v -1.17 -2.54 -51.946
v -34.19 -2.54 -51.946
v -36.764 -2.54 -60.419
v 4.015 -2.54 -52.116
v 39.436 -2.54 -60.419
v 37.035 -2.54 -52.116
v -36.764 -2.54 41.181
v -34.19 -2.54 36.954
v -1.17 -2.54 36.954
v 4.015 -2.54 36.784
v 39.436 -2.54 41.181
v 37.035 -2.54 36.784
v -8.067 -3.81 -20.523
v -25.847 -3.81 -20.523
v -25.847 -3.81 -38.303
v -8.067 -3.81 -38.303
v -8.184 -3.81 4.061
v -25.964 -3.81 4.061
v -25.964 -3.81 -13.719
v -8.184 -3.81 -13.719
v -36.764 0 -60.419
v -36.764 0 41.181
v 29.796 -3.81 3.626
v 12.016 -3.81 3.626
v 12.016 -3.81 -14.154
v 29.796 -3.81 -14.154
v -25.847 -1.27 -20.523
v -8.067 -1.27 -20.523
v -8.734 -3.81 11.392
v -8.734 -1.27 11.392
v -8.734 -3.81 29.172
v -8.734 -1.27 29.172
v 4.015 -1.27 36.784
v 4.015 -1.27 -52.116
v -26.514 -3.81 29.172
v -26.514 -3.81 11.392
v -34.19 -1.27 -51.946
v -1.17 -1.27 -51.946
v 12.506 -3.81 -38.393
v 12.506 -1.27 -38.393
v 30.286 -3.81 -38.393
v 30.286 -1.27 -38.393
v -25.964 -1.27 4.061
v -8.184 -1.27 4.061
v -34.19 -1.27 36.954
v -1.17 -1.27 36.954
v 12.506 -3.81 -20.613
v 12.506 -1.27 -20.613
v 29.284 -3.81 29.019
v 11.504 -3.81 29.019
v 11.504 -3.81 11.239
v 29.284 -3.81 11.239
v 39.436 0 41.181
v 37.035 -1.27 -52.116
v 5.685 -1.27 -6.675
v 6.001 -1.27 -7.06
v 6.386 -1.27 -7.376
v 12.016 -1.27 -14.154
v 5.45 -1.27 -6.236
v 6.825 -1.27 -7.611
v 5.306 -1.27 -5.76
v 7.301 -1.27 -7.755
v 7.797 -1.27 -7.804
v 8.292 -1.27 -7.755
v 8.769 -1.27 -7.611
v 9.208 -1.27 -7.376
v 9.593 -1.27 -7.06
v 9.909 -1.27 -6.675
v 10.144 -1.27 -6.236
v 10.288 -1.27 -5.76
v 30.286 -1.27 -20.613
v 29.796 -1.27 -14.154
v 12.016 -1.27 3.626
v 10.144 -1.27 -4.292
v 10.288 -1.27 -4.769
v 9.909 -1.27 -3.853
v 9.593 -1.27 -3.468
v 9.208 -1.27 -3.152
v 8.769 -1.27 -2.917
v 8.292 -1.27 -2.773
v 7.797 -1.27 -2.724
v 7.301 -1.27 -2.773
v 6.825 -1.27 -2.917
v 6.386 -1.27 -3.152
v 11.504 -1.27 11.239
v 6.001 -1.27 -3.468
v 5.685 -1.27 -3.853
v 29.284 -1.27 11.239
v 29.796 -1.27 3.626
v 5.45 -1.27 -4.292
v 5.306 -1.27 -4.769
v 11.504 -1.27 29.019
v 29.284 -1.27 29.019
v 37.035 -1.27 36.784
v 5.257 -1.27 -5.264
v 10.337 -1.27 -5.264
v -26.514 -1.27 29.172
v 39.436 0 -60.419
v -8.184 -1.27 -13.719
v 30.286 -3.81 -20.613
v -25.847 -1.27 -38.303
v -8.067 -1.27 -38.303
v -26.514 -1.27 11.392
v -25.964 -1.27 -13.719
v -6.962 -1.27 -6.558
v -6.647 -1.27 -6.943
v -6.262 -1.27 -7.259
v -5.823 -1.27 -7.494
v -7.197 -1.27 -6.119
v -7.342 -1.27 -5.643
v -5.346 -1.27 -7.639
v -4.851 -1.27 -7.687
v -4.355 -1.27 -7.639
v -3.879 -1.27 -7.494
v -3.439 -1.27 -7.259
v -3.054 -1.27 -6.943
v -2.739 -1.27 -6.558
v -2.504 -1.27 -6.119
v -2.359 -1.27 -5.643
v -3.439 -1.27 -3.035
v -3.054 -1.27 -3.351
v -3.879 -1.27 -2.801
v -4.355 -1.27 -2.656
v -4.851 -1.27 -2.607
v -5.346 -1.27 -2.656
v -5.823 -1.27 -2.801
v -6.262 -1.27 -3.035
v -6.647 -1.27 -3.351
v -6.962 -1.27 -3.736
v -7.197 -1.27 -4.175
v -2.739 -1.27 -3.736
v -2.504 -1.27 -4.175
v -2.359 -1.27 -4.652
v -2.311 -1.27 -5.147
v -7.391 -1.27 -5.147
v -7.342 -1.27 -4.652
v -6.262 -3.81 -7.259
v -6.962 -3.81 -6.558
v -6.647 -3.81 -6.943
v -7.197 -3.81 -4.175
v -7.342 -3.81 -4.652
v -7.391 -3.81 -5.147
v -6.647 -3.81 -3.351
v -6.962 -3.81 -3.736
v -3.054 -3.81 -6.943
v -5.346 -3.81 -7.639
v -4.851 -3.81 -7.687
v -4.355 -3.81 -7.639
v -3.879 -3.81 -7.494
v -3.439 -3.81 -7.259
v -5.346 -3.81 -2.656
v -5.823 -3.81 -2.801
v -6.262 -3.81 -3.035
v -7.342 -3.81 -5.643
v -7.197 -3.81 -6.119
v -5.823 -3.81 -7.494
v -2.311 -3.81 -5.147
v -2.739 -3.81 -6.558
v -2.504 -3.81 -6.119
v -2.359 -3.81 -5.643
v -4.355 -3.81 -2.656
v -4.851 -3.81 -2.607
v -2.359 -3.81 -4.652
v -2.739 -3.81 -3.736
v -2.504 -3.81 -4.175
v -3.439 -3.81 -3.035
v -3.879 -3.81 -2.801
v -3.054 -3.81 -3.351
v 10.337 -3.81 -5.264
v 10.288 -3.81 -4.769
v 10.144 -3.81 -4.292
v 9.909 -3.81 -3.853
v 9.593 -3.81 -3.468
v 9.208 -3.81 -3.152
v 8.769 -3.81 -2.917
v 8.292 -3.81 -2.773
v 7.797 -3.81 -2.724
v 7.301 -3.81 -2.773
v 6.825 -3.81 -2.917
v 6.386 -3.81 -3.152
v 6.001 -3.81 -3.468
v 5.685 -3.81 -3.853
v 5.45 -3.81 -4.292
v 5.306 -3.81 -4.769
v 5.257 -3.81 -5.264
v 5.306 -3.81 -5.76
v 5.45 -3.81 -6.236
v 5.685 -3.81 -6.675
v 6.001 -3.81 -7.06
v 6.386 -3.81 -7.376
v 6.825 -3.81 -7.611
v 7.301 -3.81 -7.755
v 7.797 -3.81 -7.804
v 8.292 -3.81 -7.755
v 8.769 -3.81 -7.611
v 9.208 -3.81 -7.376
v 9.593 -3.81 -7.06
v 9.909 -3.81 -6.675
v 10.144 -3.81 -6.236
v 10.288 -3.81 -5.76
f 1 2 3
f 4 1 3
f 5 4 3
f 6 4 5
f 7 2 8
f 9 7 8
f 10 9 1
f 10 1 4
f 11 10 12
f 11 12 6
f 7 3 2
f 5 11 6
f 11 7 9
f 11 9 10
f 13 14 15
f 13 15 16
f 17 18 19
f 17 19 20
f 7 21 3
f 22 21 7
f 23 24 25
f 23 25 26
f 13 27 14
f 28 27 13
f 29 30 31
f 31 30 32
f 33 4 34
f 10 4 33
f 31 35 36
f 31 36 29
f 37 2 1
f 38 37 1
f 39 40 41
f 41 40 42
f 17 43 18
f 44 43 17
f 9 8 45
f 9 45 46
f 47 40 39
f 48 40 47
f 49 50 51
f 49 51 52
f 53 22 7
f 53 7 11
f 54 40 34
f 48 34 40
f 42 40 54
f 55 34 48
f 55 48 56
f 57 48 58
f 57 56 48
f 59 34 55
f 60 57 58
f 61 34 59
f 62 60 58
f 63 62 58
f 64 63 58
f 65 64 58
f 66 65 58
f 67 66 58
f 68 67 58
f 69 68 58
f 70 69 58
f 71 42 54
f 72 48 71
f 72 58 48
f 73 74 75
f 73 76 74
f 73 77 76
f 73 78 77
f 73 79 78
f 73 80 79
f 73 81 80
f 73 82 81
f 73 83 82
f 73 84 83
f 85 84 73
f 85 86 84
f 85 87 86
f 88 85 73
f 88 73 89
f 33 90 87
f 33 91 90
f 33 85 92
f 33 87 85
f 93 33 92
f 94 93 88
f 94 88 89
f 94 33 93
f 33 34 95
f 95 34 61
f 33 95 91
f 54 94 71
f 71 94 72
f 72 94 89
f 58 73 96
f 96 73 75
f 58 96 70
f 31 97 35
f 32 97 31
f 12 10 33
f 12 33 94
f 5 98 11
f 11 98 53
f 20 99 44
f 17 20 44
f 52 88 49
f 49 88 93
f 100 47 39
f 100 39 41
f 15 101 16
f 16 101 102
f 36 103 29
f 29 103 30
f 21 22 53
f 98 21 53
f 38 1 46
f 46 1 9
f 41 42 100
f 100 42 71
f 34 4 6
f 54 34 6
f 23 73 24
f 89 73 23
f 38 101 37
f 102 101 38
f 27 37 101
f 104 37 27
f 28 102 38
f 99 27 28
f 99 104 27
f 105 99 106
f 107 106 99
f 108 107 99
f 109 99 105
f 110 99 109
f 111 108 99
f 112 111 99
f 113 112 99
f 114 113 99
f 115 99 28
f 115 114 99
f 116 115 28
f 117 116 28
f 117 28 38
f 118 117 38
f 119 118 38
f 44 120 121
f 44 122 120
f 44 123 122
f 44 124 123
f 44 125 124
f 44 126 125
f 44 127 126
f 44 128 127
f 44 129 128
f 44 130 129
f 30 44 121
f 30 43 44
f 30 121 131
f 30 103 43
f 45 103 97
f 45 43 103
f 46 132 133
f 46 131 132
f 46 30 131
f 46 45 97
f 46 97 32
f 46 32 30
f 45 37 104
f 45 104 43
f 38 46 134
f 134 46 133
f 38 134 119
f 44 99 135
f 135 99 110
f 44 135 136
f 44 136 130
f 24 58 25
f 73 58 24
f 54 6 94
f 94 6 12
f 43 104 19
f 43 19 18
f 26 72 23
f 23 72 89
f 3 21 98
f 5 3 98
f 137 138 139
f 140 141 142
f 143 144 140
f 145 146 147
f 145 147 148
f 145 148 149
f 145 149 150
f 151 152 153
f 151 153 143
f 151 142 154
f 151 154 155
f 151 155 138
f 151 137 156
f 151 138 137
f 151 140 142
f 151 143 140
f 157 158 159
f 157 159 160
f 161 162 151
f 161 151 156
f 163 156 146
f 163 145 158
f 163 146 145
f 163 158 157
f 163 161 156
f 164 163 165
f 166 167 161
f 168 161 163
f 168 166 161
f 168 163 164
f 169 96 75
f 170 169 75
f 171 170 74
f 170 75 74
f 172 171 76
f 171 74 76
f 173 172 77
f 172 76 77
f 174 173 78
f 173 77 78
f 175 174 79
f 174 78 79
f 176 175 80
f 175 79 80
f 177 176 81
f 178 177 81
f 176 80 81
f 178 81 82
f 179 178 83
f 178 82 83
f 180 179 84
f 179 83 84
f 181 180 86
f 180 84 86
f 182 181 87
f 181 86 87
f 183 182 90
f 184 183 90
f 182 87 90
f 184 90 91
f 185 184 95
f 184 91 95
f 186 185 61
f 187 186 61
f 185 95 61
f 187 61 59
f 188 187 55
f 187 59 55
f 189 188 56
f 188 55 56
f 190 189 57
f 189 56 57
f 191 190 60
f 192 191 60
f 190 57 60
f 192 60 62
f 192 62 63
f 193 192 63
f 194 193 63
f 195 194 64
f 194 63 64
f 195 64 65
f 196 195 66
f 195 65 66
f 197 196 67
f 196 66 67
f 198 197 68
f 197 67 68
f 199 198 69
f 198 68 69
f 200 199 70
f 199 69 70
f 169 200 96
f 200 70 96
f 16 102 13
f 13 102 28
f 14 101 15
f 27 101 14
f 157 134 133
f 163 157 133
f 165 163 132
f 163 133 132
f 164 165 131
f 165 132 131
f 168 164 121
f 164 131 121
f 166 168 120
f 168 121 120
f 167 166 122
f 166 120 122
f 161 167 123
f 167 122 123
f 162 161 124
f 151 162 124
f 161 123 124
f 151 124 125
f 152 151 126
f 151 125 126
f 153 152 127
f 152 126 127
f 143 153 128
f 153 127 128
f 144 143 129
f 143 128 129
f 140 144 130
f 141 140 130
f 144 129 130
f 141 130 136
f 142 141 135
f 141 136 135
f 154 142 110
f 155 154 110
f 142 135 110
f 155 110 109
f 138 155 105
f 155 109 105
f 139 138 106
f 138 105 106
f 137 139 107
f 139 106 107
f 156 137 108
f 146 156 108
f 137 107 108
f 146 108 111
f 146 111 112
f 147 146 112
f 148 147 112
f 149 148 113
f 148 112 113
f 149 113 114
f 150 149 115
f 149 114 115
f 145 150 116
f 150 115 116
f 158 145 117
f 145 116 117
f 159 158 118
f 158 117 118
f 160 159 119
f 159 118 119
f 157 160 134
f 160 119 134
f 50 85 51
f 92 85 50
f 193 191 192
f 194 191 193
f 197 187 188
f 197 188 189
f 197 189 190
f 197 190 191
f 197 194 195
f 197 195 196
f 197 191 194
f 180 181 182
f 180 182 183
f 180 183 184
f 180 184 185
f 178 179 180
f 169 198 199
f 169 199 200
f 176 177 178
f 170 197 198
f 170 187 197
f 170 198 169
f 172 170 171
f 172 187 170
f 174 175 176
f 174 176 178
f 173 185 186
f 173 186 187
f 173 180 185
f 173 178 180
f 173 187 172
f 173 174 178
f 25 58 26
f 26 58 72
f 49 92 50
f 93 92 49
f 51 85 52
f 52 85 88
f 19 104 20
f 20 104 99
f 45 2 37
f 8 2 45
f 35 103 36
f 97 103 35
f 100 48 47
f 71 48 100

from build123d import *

# Parameters (mm, degrees)
F0_W     = 76.2
F0_H     = 101.6
F1_DEPTH = 2.54
F2_W     = 33.02
F2_H     = 88.9
F3_DEPTH = 1.27
F4_W     = 17.78
F4_H     = 17.78
F5_DEPTH = 2.54
F6_R     = 2.54
F7_DEPTH = 2.54


with BuildPart() as f1:
    # F0 (on Front) → F1 (new body)
    with BuildSketch(Plane.XZ):
        with Locations((1.335782, -9.618688)):
            Rectangle(F0_W, F0_H)
    extrude(amount=F1_DEPTH)

    # F2 (on face) → F3 (cut)
    with BuildSketch(Plane.XZ.offset(2.54)):
        with Locations((-17.679934, -7.495851)):
            Rectangle(F2_W, F2_H)
        with Locations((20.525211, -7.666058)):
            Rectangle(F2_W, F2_H)
    extrude(amount=-F3_DEPTH, mode=Mode.SUBTRACT)

    # F4 (on face) → F5 (join)
    with BuildSketch(Plane.XZ.offset(1.27)):
        with Locations((-17.624406, 20.281628)):
            Rectangle(F4_W, F4_H)
        with Locations((-17.073924, -4.828554)):
            Rectangle(F4_W, F4_H)
        with Locations((-16.956719, -29.41318)):
            Rectangle(F4_W, F4_H)
        with Locations((20.393534, 20.128676)):
            Rectangle(F4_W, F4_H)
        with Locations((20.905885, -5.264044)):
            Rectangle(F4_W, F4_H)
        with Locations((21.396337, -29.502603)):
            Rectangle(F4_W, F4_H)
    extrude(amount=F5_DEPTH)

    # F6 (on face) → F7 (join)
    with BuildSketch(Plane.XZ.offset(1.27)):
        with Locations((-4.850546, -5.14735)):
            Circle(F6_R)
        with Locations((7.796882, -5.264044)):
            Circle(F6_R)
    extrude(amount=F7_DEPTH)


solid = f1.part
